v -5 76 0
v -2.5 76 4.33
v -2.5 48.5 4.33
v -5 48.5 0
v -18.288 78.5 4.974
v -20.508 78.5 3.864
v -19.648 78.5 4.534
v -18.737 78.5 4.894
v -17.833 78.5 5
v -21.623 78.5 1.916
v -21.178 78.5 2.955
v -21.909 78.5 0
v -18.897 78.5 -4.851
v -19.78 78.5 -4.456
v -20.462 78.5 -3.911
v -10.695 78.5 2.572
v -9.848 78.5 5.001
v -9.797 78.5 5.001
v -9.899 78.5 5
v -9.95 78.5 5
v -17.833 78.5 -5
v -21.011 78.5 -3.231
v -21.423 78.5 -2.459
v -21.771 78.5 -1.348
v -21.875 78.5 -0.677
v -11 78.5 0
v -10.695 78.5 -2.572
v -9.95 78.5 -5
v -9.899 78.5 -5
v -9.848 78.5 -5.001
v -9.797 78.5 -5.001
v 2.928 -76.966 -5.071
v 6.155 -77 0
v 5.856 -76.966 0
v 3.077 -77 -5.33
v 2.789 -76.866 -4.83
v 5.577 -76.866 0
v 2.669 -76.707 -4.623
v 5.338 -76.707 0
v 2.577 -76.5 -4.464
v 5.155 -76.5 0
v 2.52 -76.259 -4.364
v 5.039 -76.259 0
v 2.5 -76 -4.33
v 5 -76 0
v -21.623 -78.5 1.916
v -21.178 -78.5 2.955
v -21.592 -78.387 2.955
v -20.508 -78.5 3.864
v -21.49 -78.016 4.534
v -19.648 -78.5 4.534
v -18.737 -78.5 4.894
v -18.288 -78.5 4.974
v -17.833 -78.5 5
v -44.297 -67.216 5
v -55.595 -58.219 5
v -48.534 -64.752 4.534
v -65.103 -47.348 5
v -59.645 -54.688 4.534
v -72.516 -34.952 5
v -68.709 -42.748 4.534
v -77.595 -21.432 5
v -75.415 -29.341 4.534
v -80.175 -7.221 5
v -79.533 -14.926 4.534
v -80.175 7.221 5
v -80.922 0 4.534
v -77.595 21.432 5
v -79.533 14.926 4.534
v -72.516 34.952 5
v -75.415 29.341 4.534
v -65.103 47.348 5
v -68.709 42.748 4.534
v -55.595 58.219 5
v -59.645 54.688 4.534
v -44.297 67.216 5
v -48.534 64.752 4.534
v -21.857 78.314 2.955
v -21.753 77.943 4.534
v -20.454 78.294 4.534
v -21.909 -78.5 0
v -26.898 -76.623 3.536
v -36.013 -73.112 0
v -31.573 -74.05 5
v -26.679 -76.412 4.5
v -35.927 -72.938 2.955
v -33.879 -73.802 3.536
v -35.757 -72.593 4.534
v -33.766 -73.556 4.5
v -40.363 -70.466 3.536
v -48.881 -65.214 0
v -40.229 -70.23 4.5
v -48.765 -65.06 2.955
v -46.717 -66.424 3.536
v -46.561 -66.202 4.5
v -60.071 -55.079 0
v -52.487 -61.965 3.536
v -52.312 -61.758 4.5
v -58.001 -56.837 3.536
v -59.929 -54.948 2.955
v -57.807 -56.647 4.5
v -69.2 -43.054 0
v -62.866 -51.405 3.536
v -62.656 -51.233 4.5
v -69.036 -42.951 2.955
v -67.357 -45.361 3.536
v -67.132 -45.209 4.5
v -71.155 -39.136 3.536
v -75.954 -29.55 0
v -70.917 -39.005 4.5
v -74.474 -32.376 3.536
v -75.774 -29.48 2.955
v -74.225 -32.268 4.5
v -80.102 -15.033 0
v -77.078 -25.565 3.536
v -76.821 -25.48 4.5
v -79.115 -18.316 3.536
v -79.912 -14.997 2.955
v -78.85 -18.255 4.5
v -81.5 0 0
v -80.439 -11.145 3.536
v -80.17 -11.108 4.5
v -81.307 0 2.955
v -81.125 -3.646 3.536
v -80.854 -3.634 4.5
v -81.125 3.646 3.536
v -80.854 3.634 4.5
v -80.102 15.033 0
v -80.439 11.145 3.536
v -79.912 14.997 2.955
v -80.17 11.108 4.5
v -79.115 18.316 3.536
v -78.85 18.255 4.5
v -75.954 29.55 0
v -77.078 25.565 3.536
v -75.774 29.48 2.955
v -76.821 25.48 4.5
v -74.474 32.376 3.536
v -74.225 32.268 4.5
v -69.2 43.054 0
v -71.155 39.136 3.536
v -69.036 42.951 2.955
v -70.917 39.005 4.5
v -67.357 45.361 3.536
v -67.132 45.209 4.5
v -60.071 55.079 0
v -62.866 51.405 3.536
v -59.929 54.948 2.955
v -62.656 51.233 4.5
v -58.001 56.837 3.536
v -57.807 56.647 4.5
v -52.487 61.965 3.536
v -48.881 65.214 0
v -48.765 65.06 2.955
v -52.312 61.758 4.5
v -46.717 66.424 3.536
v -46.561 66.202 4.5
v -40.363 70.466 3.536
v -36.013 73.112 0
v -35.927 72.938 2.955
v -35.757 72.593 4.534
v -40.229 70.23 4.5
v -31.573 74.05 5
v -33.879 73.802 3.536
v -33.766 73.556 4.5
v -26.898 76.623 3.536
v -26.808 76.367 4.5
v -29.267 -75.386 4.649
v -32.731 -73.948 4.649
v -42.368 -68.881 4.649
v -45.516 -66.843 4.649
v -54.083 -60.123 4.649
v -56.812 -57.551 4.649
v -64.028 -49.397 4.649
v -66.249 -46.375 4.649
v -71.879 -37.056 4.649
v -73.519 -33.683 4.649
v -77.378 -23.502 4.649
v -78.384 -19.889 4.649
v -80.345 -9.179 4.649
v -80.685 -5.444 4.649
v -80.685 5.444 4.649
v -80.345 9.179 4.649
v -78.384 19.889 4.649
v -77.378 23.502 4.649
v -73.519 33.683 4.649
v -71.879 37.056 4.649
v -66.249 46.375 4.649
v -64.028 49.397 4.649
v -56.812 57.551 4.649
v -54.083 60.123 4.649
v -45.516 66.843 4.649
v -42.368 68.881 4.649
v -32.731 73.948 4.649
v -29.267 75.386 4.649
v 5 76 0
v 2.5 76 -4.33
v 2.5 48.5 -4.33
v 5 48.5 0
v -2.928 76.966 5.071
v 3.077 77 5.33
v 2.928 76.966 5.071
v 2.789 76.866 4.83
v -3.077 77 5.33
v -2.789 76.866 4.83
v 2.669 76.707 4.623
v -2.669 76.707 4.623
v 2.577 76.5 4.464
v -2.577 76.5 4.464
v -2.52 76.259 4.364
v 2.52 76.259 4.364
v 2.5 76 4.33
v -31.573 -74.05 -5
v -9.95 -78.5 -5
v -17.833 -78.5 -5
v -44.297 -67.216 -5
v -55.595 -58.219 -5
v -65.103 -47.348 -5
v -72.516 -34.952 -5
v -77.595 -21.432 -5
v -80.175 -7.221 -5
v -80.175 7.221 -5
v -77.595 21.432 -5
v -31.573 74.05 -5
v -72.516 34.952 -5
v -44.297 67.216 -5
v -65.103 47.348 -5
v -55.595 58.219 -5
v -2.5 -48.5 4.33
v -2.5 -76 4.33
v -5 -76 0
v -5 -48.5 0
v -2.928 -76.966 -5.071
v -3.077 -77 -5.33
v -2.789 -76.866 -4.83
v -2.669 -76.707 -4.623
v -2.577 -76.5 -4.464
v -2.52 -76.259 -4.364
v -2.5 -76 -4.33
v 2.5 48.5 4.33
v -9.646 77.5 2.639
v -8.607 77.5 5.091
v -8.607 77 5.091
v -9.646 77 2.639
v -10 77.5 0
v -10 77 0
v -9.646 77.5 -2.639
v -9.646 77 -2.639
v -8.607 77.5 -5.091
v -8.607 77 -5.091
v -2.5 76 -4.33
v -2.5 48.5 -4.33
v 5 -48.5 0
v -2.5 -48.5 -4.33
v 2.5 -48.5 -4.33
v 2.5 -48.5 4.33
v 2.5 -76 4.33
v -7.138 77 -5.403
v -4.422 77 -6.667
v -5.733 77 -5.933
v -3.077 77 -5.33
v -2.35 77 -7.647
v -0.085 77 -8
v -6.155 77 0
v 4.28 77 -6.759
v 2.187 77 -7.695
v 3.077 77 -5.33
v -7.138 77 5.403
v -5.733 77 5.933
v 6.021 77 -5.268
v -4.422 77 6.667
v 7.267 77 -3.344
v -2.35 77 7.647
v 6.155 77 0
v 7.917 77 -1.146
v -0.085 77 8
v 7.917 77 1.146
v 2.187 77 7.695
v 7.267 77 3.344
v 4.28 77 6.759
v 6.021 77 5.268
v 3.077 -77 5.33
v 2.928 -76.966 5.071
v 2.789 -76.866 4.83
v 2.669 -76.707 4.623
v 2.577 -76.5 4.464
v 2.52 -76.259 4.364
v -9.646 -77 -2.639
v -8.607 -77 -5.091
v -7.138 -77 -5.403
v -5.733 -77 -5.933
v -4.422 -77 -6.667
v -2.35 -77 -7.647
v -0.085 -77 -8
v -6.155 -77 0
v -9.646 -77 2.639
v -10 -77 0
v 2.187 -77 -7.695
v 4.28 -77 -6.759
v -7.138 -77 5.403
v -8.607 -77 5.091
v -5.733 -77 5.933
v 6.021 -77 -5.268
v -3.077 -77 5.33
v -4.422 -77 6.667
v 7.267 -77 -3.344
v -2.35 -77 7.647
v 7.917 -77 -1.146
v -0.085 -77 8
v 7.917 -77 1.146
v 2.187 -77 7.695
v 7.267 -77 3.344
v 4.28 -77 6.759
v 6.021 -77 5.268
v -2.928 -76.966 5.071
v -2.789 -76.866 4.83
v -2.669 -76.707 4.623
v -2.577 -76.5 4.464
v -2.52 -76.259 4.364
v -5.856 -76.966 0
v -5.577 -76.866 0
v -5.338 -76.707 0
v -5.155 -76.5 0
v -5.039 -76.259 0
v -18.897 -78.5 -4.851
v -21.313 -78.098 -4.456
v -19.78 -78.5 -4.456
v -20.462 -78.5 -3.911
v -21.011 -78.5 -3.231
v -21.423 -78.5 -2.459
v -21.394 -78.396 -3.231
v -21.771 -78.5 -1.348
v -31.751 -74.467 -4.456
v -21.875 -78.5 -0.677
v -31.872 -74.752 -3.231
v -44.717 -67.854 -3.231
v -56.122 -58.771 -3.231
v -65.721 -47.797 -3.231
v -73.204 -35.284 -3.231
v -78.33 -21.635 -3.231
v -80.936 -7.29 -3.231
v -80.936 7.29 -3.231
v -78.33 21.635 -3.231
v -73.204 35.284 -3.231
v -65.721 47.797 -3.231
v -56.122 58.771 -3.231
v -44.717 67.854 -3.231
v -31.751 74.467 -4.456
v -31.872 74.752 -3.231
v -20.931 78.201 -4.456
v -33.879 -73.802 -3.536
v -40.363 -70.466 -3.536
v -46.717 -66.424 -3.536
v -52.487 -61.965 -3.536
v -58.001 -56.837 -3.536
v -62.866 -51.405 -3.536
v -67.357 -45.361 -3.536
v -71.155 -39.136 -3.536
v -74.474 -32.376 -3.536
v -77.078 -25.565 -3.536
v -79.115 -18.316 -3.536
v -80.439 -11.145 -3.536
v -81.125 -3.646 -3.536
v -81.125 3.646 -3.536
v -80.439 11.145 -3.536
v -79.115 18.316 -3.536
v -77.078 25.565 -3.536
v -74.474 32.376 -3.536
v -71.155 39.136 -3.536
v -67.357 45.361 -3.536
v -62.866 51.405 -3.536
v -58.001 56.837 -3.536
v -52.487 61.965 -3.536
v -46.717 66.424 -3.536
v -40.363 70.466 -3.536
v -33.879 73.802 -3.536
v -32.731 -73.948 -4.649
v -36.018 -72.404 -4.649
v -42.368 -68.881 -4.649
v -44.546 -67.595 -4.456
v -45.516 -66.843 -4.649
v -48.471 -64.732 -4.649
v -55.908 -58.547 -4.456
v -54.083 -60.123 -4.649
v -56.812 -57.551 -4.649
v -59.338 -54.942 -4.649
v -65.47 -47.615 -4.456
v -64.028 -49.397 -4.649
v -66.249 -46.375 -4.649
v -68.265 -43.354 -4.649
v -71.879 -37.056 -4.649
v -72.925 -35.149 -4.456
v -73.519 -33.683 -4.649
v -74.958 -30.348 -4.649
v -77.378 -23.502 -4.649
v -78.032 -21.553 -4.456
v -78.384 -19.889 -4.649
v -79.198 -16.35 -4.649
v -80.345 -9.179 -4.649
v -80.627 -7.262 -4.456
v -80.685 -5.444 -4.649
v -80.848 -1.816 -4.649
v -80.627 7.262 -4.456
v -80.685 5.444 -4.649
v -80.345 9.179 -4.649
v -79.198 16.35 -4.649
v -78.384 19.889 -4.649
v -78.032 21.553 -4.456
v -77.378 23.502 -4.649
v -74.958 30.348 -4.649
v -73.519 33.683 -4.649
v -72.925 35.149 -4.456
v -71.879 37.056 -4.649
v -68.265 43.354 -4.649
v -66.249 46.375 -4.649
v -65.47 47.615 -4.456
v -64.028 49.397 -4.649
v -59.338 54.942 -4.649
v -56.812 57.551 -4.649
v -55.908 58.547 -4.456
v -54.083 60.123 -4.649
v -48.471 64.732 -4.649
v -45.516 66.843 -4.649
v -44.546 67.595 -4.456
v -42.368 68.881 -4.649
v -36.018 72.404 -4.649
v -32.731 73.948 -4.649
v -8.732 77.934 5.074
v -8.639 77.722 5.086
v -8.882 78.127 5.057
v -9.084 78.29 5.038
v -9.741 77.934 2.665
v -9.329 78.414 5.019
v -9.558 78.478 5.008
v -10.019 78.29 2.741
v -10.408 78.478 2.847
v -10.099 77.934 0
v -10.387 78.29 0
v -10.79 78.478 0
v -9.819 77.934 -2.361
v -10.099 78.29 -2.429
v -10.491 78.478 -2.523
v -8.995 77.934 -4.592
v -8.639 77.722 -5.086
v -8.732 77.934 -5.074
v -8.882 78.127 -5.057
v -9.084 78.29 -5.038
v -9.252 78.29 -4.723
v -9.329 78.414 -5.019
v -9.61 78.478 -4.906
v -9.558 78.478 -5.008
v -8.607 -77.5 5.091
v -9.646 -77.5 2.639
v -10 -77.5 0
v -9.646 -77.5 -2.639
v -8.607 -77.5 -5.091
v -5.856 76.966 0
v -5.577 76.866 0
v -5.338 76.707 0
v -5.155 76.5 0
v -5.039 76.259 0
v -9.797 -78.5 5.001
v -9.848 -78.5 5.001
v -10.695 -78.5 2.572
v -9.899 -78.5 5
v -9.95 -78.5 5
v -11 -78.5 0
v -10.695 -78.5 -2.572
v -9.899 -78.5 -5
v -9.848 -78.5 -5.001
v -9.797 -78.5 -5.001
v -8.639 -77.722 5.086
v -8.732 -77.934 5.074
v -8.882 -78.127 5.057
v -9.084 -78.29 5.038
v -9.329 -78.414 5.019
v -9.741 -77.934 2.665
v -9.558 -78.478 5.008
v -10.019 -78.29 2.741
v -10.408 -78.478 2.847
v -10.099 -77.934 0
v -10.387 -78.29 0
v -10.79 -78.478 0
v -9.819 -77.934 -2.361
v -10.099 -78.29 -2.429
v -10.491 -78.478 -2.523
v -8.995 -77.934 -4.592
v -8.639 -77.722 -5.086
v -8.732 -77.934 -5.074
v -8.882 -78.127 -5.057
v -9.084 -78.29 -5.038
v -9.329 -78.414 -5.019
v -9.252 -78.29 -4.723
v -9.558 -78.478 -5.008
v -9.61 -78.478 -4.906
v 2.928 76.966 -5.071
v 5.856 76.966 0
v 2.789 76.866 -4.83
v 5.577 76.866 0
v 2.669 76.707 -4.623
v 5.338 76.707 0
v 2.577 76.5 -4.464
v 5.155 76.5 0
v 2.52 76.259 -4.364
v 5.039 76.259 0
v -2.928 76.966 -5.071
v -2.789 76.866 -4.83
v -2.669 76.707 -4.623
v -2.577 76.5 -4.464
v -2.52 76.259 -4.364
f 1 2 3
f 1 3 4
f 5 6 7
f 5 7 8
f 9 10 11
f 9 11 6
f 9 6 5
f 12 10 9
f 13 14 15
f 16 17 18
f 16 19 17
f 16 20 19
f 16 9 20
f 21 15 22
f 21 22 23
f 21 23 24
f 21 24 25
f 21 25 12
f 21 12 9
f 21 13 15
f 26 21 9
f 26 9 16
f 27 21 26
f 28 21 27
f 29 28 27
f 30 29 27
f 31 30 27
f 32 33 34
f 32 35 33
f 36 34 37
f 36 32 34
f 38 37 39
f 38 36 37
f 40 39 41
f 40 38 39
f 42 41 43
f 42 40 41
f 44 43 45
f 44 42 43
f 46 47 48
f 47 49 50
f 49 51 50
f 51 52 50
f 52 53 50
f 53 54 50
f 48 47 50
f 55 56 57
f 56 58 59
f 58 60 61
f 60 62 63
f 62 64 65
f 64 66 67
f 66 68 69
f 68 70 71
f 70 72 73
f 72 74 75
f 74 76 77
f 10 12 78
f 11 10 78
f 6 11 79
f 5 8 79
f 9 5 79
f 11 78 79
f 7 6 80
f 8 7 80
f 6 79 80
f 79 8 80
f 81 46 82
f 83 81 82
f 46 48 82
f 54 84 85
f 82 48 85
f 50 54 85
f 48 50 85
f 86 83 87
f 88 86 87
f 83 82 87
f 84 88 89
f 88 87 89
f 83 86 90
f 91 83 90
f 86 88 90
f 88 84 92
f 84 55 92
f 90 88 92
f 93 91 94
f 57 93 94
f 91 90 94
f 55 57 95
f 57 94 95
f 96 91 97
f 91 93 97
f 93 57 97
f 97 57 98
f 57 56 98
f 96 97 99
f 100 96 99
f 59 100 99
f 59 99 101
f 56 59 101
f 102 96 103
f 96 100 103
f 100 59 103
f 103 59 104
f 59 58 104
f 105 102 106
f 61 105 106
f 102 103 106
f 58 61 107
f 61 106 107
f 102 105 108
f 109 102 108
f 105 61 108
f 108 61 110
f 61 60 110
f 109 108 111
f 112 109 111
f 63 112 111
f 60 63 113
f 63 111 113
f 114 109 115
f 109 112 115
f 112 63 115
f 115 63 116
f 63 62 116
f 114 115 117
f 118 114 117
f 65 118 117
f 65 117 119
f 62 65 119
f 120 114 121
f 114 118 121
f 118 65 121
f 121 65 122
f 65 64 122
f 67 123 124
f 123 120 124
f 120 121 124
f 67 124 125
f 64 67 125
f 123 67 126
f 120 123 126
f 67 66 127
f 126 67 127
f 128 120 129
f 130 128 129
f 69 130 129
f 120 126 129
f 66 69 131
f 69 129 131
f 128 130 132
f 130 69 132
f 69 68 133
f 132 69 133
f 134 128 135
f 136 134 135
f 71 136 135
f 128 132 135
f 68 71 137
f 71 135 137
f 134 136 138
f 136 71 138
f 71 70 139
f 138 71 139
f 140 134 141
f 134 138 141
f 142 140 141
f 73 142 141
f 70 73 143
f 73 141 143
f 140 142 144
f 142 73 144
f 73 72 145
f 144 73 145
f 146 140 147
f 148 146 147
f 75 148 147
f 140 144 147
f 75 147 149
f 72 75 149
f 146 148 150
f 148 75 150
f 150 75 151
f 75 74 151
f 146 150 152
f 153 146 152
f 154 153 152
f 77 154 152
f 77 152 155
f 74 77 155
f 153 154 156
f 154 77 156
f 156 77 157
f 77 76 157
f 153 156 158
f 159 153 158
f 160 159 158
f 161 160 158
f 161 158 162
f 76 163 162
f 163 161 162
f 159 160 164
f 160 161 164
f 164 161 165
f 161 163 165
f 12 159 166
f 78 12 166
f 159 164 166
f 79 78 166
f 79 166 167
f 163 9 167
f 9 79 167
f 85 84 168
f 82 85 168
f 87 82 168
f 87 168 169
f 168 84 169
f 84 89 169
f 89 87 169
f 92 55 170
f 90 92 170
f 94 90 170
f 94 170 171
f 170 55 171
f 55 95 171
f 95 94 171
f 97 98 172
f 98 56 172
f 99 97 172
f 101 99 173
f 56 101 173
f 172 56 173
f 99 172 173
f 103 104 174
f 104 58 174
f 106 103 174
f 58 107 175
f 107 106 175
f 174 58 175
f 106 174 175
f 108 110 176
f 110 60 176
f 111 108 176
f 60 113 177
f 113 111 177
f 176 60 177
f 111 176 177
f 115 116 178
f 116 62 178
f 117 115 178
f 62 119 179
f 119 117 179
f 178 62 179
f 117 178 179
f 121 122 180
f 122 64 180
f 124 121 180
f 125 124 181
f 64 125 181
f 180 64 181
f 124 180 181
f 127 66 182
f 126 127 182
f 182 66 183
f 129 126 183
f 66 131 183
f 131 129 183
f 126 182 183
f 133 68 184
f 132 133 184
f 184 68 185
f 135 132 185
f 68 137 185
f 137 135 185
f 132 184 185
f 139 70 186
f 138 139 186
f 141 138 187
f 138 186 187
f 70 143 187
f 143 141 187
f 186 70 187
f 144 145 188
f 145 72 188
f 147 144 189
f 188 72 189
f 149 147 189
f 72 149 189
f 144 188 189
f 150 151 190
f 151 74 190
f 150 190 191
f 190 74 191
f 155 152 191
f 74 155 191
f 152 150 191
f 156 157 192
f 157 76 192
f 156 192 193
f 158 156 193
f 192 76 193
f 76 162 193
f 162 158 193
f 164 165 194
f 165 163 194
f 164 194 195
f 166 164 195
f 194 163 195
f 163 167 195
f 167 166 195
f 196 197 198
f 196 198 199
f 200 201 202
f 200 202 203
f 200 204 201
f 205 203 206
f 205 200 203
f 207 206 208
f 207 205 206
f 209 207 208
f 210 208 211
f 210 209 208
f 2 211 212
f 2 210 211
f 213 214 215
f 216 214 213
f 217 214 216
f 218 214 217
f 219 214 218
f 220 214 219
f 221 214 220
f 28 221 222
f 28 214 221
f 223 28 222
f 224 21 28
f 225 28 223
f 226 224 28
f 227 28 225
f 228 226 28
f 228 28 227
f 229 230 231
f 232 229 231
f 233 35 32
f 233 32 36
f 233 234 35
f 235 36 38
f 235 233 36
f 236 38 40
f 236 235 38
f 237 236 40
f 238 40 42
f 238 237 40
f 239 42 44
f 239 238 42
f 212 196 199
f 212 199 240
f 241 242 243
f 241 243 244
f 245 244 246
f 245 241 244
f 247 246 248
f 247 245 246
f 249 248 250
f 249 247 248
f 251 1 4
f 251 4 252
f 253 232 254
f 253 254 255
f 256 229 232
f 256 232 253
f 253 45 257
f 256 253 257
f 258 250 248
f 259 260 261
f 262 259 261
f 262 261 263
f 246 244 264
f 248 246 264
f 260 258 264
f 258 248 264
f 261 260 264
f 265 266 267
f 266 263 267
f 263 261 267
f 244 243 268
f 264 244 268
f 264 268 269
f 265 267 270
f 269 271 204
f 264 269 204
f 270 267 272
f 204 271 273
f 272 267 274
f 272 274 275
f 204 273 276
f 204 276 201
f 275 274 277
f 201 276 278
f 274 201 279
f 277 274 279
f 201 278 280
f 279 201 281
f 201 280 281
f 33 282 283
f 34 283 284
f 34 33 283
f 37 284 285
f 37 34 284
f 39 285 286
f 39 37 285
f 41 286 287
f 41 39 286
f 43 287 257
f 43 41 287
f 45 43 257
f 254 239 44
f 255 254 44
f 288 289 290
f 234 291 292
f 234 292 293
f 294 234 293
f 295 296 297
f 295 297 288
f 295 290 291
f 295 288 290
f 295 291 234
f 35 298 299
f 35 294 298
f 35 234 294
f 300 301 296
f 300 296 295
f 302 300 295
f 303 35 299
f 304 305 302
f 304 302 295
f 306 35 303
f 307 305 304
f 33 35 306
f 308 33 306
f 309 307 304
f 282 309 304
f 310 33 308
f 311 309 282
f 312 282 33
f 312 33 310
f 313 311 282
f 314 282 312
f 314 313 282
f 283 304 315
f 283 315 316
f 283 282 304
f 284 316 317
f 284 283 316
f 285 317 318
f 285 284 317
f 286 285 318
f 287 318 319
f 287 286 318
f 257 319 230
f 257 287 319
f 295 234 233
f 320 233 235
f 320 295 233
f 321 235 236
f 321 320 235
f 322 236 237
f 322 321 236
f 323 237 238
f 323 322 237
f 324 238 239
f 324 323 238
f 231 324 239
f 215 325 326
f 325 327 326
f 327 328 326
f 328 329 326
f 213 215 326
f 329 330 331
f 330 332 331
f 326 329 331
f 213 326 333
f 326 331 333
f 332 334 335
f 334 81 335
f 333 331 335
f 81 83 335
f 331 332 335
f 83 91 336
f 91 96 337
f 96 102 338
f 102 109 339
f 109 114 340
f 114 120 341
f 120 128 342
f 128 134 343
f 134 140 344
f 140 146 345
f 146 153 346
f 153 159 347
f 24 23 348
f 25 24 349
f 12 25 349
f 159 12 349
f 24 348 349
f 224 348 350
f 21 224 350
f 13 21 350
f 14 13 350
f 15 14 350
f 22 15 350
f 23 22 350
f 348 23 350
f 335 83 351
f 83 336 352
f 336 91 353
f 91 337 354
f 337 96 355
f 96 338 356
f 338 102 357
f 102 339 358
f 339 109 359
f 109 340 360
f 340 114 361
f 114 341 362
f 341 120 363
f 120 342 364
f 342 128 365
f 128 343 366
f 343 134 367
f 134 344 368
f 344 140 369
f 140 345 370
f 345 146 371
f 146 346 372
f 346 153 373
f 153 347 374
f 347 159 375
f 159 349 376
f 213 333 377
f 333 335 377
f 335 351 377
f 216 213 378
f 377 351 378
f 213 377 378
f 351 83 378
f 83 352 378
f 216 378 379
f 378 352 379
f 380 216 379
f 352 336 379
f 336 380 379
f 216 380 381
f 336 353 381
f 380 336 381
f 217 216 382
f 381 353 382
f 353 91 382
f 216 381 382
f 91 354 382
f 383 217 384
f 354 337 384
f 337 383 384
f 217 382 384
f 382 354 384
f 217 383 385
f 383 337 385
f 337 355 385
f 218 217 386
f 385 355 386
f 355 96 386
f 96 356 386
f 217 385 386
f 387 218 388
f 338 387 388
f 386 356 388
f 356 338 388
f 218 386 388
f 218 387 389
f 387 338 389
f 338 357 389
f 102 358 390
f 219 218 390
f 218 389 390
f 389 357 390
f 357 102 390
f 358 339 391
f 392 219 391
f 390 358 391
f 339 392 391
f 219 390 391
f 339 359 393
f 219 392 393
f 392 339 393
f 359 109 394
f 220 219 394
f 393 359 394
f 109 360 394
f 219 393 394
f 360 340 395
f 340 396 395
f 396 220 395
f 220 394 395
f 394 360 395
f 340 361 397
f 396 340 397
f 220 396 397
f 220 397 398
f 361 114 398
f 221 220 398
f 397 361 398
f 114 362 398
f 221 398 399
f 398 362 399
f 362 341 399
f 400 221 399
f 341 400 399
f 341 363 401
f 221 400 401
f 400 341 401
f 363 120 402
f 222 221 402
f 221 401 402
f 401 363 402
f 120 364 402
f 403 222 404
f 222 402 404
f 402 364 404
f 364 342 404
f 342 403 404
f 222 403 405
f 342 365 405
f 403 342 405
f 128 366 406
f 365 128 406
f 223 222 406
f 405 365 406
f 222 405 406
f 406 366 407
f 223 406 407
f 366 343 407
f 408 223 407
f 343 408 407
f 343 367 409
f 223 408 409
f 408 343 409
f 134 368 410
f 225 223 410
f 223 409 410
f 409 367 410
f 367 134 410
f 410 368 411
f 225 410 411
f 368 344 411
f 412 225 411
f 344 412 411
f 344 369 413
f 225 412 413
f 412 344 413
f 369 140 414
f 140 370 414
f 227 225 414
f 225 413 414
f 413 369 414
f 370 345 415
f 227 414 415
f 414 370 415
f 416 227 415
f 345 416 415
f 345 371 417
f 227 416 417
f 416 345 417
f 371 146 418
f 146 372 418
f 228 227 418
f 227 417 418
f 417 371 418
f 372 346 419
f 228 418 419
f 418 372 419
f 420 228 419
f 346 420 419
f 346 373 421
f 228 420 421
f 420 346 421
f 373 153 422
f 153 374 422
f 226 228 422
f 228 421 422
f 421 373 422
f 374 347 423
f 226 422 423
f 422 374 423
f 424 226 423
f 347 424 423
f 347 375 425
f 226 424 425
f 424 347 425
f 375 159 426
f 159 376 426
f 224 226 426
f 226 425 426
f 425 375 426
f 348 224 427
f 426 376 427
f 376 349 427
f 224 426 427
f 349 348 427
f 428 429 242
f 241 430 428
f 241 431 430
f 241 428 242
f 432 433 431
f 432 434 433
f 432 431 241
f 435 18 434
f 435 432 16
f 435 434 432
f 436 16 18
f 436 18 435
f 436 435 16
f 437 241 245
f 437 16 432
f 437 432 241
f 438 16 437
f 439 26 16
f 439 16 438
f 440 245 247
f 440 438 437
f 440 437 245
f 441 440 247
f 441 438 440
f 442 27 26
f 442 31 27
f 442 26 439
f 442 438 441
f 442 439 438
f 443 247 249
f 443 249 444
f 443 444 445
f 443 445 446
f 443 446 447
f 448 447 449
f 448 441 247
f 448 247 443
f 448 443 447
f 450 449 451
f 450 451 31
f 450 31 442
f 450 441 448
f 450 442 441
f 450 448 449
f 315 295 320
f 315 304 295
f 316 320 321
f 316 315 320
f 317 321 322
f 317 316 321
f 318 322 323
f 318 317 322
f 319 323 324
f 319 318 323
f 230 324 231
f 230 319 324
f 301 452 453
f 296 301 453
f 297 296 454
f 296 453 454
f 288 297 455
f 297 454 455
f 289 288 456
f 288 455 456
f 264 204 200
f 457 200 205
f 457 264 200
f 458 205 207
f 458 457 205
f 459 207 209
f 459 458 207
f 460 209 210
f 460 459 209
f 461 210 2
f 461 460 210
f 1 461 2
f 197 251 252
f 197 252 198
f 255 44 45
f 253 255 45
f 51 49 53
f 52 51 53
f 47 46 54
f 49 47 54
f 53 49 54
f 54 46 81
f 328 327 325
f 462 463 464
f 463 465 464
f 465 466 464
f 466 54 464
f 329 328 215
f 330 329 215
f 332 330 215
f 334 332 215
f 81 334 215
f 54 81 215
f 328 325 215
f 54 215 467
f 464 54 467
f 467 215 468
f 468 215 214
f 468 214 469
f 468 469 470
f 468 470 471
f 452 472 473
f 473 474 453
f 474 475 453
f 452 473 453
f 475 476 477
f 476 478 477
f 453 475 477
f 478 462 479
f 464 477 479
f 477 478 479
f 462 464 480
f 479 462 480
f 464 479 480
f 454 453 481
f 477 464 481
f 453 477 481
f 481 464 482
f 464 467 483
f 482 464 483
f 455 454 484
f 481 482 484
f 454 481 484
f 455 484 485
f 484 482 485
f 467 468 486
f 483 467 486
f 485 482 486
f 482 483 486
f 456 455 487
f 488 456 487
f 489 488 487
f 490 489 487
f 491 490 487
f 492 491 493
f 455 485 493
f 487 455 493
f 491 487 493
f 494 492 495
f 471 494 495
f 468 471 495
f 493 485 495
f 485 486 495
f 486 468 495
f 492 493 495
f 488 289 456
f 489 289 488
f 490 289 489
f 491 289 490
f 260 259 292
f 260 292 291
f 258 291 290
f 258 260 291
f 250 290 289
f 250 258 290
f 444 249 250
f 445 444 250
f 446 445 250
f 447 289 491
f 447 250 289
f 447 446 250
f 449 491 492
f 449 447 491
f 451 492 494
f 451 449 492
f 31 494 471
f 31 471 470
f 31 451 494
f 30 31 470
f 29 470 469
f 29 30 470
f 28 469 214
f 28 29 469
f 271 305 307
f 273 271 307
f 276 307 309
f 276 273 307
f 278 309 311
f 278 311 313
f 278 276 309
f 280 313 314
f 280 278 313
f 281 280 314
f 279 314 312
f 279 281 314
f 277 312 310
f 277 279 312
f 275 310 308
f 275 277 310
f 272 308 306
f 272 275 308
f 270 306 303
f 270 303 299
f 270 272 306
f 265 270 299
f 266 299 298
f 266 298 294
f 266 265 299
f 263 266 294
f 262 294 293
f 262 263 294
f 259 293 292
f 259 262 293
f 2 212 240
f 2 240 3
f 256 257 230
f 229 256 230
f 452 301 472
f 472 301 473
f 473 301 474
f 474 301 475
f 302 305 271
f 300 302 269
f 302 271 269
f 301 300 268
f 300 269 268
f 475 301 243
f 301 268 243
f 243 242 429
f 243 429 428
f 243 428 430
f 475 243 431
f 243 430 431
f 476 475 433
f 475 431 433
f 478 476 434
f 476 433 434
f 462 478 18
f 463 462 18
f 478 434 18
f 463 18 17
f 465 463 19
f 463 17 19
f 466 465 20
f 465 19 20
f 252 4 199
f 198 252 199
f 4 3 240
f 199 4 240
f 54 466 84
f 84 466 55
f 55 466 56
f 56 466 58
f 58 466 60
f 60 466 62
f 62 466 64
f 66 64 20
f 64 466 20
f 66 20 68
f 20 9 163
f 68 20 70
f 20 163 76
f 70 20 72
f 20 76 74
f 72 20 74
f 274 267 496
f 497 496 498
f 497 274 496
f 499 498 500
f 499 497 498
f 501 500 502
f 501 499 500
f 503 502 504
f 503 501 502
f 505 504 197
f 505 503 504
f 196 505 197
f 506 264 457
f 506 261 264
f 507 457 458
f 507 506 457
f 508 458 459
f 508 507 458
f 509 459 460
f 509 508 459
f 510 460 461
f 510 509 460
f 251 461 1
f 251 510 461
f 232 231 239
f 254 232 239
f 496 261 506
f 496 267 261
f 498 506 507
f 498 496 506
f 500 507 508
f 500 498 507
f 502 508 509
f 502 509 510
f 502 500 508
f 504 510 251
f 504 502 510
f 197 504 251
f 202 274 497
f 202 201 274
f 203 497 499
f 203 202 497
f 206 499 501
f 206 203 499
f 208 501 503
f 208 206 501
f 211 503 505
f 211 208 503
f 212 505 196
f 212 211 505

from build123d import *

# Parameters (mm, degrees)
BOSS_EXTRUDE1_DEPTH = 5
SKETCH2_R           = 8
BOSS_EXTRUDE2_DEPTH = 157
FILLET1_R           = 10
CUT_EXTRUDE1_DEPTH  = 30
SKETCH5_R           = 10
CUT_EXTRUDE2_DEPTH  = 1.5
FILLET2_SIZE        = 5
FILLET2_SIZE_2      = 1
FILLET4_R           = 1


with BuildPart() as part:
    # Sketch1 → Boss-Extrude1 (new, symmetric)
    with BuildSketch(Plane.XY):
        with BuildLine():
            Line((0, 78.5), (0, -78.5))
            Line((0, -78.5), (-21.9089023, -78.5))
            ThreePointArc((-21.9089023, -78.5), (-81.5, 0), (-21.9089023, 78.5))
            Line((-21.9089023, 78.5), (0, 78.5))
        make_face()
    extrude(amount=BOSS_EXTRUDE1_DEPTH, both=True)

    # Sketch2 → Boss-Extrude2 (add)
    with BuildSketch(Plane(origin=(0, 78.5, 0), x_dir=(1, 0, 0), z_dir=(0, 1, 0))):
        Circle(SKETCH2_R)
    extrude(amount=-BOSS_EXTRUDE2_DEPTH)

    # Fillet1
    fillet1_edges = [part.edges().sort_by_distance(p)[0] for p in [
        (-6.244997998, 0, -5),
        (-6.244997998, 0, 5),
    ]]
    fillet(fillet1_edges, radius=FILLET1_R)

    # Sketch3 → Cut-Extrude1 (cut)
    with BuildSketch(Plane.XZ.offset(78.5)):
        Polygon((2.5, -4.330127019), (5, 0), (2.5, 4.330127019), (-2.5, 4.330127019), (-5, 0), (-2.5, -4.330127019), align=None)
    cut_extrude1 = extrude(amount=-CUT_EXTRUDE1_DEPTH, mode=Mode.SUBTRACT)

    # Sketch5 → Cut-Extrude2 (cut)
    with BuildSketch(Plane.XZ.offset(78.5)):
        Circle(SKETCH5_R)
    cut_extrude2 = extrude(amount=-CUT_EXTRUDE2_DEPTH, mode=Mode.SUBTRACT)

    # Mirror1: Cut-Extrude1, Cut-Extrude2 across plane
    add(cut_extrude1.mirror(Plane.ZX), mode=Mode.SUBTRACT)
    add(cut_extrude2.mirror(Plane.ZX), mode=Mode.SUBTRACT)

    # Fillet2
    # an asymmetric fillet: 5, 1 mm, written as the material it takes off along each edge
    with BuildSketch(Plane(origin=(0, 0, 5), x_dir=(-0.11834786572698561, -0.9929721963266983, 0), z_dir=(0.9929721963266983, -0.11834786572698561, 0))) as fillet2_piece_1:
        with BuildLine():
            Bezier((81.5, FILLET2_SIZE), (81.5, 0), (81.5 - FILLET2_SIZE_2, 0), weights=[1, 0.707106781, 1])
            Line((81.5 - FILLET2_SIZE_2, 0), (81.5, 0))
            Line((81.5, 0), (81.5, FILLET2_SIZE))
        make_face()
    revolve(axis=Axis((0, 0, 5), (0, 0, -1)), revolution_arc=166.406474405, mode=Mode.SUBTRACT)
    with BuildSketch(Plane(origin=(0, 0, -5), x_dir=(-0.11834786572698561, -0.9929721963266983, 0), z_dir=(0.9929721963266983, -0.11834786572698561, 0))) as fillet2_piece_2:
        with BuildLine():
            Bezier((81.5 - FILLET2_SIZE_2, 0), (81.5, 0), (81.5, -FILLET2_SIZE), weights=[1, 0.707106781, 1])
            Line((81.5, -FILLET2_SIZE), (81.5, 0))
            Line((81.5, 0), (81.5 - FILLET2_SIZE_2, 0))
        make_face()
    revolve(axis=Axis((0, 0, -5), (0, 0, -1)), revolution_arc=166.406474405, mode=Mode.SUBTRACT)

    # Fillet4
    fillet4_edges = [part.edges().sort_by_distance(p)[0] for p in [
        (-3.75, 77, -2.165063509),
        (-10, 78.5, 0),
        (3.75, 77, -2.165063509),
        (0, 77, -4.330127019),
        (-3.75, 77, 2.165063509),
        (0, 77, 4.330127019),
        (3.75, 77, 2.165063509),
        (3.75, -77, -2.165063509),
        (-10, -78.5, 0),
        (0, -77, -4.330127019),
        (-3.75, -77, -2.165063509),
        (-3.75, -77, 2.165063509),
        (0, -77, 4.330127019),
        (3.75, -77, 2.165063509),
    ]]
    fillet(fillet4_edges, radius=FILLET4_R)


solid = part.part
